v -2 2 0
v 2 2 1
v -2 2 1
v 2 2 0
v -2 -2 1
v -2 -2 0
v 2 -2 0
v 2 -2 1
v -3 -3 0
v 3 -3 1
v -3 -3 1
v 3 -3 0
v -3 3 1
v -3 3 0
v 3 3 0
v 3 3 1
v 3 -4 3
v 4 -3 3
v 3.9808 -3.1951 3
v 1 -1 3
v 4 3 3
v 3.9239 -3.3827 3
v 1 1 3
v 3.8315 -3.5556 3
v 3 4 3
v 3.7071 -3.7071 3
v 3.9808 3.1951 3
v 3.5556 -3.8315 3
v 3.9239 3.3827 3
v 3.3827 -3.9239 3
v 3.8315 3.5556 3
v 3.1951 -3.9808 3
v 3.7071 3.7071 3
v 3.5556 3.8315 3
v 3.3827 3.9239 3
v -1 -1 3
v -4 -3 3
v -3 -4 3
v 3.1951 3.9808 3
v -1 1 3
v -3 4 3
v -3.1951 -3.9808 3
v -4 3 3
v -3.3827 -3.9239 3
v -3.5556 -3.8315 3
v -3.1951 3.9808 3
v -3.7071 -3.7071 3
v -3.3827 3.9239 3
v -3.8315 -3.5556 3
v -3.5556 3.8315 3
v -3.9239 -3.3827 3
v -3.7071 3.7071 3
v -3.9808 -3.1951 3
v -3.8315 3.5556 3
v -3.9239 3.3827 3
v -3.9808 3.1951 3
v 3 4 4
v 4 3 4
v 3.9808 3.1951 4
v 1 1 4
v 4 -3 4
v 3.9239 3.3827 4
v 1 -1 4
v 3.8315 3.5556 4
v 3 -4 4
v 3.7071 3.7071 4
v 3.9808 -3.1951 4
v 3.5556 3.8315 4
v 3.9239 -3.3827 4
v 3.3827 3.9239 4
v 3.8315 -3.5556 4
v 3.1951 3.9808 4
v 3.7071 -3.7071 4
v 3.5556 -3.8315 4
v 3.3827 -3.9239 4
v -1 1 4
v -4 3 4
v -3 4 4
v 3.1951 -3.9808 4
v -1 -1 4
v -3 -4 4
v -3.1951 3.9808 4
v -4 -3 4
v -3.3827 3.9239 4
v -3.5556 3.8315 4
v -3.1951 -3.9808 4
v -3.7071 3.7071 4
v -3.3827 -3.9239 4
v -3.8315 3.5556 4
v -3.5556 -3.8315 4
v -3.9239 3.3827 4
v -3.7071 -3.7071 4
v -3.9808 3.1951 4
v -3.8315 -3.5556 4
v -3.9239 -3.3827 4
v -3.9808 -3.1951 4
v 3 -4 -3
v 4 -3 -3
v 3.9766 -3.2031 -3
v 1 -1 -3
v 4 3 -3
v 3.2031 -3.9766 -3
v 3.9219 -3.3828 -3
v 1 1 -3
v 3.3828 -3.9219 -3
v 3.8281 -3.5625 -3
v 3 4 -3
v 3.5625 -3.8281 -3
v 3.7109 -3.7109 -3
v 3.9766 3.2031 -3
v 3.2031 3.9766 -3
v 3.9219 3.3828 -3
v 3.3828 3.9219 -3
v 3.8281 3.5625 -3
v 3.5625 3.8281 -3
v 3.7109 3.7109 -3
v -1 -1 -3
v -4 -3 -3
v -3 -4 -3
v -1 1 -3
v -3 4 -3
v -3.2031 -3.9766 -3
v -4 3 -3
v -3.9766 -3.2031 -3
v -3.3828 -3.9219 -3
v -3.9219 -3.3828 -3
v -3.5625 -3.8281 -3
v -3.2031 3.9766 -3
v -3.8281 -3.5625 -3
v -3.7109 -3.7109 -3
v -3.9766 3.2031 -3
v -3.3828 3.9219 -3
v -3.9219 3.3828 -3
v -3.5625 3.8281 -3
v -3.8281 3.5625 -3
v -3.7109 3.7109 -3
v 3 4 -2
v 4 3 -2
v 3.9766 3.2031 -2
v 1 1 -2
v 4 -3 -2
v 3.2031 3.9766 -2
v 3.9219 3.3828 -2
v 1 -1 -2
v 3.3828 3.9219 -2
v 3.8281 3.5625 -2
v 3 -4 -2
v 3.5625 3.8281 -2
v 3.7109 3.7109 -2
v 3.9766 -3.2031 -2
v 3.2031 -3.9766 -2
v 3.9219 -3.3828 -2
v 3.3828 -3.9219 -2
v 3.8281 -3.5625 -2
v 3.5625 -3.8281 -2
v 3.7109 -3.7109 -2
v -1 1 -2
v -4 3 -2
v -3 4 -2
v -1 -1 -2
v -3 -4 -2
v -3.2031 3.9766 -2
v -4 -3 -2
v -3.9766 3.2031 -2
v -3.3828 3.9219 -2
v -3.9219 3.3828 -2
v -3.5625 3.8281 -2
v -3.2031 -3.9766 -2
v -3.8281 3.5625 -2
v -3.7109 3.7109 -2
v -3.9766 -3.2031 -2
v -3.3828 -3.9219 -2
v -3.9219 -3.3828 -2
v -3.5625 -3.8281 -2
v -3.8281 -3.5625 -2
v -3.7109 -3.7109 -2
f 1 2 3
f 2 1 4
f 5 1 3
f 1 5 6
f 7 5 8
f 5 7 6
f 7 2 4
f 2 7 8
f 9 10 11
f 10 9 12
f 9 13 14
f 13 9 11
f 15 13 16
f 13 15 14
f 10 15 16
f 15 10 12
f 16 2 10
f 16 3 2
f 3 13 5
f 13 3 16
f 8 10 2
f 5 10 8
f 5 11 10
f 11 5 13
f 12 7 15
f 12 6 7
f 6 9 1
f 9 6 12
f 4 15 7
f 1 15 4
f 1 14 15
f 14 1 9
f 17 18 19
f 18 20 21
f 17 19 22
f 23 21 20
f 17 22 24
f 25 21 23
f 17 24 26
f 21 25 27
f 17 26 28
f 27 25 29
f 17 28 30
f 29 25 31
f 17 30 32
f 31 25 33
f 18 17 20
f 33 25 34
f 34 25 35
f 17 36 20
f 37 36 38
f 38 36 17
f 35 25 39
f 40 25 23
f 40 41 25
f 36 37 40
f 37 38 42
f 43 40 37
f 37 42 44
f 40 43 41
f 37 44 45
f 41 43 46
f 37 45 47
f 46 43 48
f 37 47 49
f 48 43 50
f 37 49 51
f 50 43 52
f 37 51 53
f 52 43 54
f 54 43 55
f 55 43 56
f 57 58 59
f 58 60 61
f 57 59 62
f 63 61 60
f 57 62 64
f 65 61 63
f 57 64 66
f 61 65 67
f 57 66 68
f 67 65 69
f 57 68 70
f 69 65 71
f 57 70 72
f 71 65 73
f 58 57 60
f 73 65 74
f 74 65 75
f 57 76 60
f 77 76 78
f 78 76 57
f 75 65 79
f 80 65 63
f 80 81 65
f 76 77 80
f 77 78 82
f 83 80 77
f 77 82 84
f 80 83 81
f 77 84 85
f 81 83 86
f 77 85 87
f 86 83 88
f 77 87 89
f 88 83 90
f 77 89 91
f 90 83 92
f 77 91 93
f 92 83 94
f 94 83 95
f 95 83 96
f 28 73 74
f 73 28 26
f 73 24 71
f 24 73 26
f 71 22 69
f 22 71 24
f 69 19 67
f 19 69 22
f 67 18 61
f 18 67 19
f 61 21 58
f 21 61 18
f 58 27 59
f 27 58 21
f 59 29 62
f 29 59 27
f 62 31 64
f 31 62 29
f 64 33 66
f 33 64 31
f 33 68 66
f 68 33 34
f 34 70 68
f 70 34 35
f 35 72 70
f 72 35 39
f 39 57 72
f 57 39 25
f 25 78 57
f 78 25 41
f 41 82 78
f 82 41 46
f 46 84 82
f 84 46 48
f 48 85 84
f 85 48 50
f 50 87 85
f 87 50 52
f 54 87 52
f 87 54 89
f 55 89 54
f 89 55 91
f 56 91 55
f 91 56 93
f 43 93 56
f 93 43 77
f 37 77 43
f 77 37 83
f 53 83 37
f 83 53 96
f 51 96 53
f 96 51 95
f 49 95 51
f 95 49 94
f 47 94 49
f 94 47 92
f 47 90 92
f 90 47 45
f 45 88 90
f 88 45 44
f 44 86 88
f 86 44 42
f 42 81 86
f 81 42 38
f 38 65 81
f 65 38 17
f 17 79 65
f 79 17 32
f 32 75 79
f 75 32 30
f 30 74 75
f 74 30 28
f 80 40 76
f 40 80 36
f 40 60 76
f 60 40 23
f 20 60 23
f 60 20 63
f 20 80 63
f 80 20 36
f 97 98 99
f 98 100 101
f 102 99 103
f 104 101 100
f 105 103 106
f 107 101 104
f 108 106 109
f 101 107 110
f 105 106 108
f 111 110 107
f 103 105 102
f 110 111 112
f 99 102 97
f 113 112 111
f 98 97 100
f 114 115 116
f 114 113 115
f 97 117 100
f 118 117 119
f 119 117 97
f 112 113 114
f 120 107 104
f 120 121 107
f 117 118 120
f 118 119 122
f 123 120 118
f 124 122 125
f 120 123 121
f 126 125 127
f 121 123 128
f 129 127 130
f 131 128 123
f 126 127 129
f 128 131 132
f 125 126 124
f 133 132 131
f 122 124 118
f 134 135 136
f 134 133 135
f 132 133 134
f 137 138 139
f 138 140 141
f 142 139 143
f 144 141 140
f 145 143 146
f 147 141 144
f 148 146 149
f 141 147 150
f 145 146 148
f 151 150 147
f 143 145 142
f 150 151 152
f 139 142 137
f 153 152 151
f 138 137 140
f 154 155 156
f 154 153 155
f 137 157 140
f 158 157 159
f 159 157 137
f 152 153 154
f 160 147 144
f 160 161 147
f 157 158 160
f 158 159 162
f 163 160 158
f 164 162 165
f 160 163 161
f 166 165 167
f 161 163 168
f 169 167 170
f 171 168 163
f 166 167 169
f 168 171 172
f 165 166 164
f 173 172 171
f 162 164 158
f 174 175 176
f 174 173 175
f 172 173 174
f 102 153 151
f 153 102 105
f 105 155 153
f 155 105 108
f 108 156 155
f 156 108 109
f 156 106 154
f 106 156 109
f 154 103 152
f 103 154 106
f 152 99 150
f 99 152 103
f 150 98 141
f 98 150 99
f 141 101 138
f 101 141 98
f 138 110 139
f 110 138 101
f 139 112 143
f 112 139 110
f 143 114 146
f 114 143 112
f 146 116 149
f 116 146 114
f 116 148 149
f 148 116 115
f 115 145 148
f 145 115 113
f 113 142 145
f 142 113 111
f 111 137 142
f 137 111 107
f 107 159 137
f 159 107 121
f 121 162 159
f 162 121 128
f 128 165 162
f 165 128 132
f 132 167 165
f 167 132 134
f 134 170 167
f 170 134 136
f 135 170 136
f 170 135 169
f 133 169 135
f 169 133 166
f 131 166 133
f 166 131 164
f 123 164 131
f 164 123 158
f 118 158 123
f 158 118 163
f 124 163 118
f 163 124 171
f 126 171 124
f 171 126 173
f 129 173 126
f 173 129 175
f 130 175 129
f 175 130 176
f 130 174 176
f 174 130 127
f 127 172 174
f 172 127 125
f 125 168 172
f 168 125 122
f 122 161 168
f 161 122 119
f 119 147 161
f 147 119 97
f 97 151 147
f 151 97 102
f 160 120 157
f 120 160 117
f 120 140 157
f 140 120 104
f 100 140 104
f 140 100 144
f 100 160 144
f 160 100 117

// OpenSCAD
union(){
	polyhedron(points=[[2.,-2.,0.],[-2.,-2.,0.],[-2.,2.,0.],[2.,2.,0.],[3.,3.,0.],[-3.,3.,0.],[-3.,-3.,0.],[3.,-3.,0.],[2.,-2.,1.],[-2.,-2.,1.],[-2.,2.,1.],[2.,2.,1.],[3.,3.,1.],[-3.,3.,1.],[-3.,-3.,1.],[3.,-3.,1.]], faces=[[3,10,11],[3,2,10],[2,9,10],[2,1,9],[1,8,9],[1,0,8],[0,11,8],[0,3,11],[7,14,15],[7,6,14],[6,13,14],[6,5,13],[5,12,13],[5,4,12],[4,15,12],[4,7,15],[13,12,15,8,11,10,9],[9,8,15,14,13],[1,2,3,0,7,4,5],[5,6,7,0,1]], convexity=10);
	translate([0.000000, 0.000000, 3.000000])
		linear_extrude(height=1.000000, center=false, convexity=10, slices=20, scale=[1.000000, 1.000000], $fn=16)
			minkowski(){
				polygon(points=[[3.,-3.],[-3.,-3.],[-3.,3.],[3.,3.],[2.,2.],[-2.,2.],[-2.,-2.],[2.,-2.]], paths=[[3,2,1,0],[7,6,5,4]], convexity=10);
				polygon(points=[[1.,-0.],[0.980785280403,-0.195090322016],[0.923879532511,-0.382683432365],[0.831469612303,-0.55557023302],[0.707106781187,-0.707106781187],[0.55557023302,-0.831469612303],[0.382683432365,-0.923879532511],[0.195090322016,-0.980785280403],[6.12323399574e-17,-1.],[-0.195090322016,-0.980785280403],[-0.382683432365,-0.923879532511],[-0.55557023302,-0.831469612303],[-0.707106781187,-0.707106781187],[-0.831469612303,-0.55557023302],[-0.923879532511,-0.382683432365],[-0.980785280403,-0.195090322016],[-1.,-1.22464679915e-16],[-0.980785280403,0.195090322016],[-0.923879532511,0.382683432365],[-0.831469612303,0.55557023302],[-0.707106781187,0.707106781187],[-0.55557023302,0.831469612303],[-0.382683432365,0.923879532511],[-0.195090322016,0.980785280403],[-1.83697019872e-16,1.],[0.195090322016,0.980785280403],[0.382683432365,0.923879532511],[0.55557023302,0.831469612303],[0.707106781187,0.707106781187],[0.831469612303,0.55557023302],[0.923879532511,0.382683432365],[0.980785280403,0.195090322016]], convexity=10);
			}
	translate([0.000000, 0.000000, -3.000000])
		linear_extrude(height=1.000000, center=false, convexity=10, slices=20, scale=[1.000000, 1.000000], $fn=16)
			union(){
				polygon(points=[[3.203125,-3.9765625],[3.3828125,-3.921875],[3.5625,-3.828125],[3.7109375,-3.7109375],[3.828125,-3.5625],[3.921875,-3.3828125],[3.9765625,-3.203125],[4.,-3.],[4.,3.],[3.9765625,3.203125],[3.921875,3.3828125],[3.828125,3.5625],[3.7109375,3.7109375],[3.5625,3.828125],[3.3828125,3.921875],[3.203125,3.9765625],[3.,4.],[-3.,4.],[-3.203125,3.9765625],[-3.3828125,3.921875],[-3.5625,3.828125],[-3.7109375,3.7109375],[-3.828125,3.5625],[-3.921875,3.3828125],[-3.9765625,3.203125],[-4.,3.],[-4.,-3.],[-3.9765625,-3.203125],[-3.921875,-3.3828125],[-3.828125,-3.5625],[-3.7109375,-3.7109375],[-3.5625,-3.828125],[-3.3828125,-3.921875],[-3.203125,-3.9765625],[-3.,-4.],[3.,-4.],[-1.,1.],[1.,1.],[1.,-1.],[-1.,-1.]], paths=[[35,34,33,32,31,30,29,28,27,26,25,24,23,22,21,20,19,18,17,16,15,14,13,12,11,10,9,8,7,6,5,4,3,2,1,0],[39,38,37,36]], convexity=10);
			}
}
